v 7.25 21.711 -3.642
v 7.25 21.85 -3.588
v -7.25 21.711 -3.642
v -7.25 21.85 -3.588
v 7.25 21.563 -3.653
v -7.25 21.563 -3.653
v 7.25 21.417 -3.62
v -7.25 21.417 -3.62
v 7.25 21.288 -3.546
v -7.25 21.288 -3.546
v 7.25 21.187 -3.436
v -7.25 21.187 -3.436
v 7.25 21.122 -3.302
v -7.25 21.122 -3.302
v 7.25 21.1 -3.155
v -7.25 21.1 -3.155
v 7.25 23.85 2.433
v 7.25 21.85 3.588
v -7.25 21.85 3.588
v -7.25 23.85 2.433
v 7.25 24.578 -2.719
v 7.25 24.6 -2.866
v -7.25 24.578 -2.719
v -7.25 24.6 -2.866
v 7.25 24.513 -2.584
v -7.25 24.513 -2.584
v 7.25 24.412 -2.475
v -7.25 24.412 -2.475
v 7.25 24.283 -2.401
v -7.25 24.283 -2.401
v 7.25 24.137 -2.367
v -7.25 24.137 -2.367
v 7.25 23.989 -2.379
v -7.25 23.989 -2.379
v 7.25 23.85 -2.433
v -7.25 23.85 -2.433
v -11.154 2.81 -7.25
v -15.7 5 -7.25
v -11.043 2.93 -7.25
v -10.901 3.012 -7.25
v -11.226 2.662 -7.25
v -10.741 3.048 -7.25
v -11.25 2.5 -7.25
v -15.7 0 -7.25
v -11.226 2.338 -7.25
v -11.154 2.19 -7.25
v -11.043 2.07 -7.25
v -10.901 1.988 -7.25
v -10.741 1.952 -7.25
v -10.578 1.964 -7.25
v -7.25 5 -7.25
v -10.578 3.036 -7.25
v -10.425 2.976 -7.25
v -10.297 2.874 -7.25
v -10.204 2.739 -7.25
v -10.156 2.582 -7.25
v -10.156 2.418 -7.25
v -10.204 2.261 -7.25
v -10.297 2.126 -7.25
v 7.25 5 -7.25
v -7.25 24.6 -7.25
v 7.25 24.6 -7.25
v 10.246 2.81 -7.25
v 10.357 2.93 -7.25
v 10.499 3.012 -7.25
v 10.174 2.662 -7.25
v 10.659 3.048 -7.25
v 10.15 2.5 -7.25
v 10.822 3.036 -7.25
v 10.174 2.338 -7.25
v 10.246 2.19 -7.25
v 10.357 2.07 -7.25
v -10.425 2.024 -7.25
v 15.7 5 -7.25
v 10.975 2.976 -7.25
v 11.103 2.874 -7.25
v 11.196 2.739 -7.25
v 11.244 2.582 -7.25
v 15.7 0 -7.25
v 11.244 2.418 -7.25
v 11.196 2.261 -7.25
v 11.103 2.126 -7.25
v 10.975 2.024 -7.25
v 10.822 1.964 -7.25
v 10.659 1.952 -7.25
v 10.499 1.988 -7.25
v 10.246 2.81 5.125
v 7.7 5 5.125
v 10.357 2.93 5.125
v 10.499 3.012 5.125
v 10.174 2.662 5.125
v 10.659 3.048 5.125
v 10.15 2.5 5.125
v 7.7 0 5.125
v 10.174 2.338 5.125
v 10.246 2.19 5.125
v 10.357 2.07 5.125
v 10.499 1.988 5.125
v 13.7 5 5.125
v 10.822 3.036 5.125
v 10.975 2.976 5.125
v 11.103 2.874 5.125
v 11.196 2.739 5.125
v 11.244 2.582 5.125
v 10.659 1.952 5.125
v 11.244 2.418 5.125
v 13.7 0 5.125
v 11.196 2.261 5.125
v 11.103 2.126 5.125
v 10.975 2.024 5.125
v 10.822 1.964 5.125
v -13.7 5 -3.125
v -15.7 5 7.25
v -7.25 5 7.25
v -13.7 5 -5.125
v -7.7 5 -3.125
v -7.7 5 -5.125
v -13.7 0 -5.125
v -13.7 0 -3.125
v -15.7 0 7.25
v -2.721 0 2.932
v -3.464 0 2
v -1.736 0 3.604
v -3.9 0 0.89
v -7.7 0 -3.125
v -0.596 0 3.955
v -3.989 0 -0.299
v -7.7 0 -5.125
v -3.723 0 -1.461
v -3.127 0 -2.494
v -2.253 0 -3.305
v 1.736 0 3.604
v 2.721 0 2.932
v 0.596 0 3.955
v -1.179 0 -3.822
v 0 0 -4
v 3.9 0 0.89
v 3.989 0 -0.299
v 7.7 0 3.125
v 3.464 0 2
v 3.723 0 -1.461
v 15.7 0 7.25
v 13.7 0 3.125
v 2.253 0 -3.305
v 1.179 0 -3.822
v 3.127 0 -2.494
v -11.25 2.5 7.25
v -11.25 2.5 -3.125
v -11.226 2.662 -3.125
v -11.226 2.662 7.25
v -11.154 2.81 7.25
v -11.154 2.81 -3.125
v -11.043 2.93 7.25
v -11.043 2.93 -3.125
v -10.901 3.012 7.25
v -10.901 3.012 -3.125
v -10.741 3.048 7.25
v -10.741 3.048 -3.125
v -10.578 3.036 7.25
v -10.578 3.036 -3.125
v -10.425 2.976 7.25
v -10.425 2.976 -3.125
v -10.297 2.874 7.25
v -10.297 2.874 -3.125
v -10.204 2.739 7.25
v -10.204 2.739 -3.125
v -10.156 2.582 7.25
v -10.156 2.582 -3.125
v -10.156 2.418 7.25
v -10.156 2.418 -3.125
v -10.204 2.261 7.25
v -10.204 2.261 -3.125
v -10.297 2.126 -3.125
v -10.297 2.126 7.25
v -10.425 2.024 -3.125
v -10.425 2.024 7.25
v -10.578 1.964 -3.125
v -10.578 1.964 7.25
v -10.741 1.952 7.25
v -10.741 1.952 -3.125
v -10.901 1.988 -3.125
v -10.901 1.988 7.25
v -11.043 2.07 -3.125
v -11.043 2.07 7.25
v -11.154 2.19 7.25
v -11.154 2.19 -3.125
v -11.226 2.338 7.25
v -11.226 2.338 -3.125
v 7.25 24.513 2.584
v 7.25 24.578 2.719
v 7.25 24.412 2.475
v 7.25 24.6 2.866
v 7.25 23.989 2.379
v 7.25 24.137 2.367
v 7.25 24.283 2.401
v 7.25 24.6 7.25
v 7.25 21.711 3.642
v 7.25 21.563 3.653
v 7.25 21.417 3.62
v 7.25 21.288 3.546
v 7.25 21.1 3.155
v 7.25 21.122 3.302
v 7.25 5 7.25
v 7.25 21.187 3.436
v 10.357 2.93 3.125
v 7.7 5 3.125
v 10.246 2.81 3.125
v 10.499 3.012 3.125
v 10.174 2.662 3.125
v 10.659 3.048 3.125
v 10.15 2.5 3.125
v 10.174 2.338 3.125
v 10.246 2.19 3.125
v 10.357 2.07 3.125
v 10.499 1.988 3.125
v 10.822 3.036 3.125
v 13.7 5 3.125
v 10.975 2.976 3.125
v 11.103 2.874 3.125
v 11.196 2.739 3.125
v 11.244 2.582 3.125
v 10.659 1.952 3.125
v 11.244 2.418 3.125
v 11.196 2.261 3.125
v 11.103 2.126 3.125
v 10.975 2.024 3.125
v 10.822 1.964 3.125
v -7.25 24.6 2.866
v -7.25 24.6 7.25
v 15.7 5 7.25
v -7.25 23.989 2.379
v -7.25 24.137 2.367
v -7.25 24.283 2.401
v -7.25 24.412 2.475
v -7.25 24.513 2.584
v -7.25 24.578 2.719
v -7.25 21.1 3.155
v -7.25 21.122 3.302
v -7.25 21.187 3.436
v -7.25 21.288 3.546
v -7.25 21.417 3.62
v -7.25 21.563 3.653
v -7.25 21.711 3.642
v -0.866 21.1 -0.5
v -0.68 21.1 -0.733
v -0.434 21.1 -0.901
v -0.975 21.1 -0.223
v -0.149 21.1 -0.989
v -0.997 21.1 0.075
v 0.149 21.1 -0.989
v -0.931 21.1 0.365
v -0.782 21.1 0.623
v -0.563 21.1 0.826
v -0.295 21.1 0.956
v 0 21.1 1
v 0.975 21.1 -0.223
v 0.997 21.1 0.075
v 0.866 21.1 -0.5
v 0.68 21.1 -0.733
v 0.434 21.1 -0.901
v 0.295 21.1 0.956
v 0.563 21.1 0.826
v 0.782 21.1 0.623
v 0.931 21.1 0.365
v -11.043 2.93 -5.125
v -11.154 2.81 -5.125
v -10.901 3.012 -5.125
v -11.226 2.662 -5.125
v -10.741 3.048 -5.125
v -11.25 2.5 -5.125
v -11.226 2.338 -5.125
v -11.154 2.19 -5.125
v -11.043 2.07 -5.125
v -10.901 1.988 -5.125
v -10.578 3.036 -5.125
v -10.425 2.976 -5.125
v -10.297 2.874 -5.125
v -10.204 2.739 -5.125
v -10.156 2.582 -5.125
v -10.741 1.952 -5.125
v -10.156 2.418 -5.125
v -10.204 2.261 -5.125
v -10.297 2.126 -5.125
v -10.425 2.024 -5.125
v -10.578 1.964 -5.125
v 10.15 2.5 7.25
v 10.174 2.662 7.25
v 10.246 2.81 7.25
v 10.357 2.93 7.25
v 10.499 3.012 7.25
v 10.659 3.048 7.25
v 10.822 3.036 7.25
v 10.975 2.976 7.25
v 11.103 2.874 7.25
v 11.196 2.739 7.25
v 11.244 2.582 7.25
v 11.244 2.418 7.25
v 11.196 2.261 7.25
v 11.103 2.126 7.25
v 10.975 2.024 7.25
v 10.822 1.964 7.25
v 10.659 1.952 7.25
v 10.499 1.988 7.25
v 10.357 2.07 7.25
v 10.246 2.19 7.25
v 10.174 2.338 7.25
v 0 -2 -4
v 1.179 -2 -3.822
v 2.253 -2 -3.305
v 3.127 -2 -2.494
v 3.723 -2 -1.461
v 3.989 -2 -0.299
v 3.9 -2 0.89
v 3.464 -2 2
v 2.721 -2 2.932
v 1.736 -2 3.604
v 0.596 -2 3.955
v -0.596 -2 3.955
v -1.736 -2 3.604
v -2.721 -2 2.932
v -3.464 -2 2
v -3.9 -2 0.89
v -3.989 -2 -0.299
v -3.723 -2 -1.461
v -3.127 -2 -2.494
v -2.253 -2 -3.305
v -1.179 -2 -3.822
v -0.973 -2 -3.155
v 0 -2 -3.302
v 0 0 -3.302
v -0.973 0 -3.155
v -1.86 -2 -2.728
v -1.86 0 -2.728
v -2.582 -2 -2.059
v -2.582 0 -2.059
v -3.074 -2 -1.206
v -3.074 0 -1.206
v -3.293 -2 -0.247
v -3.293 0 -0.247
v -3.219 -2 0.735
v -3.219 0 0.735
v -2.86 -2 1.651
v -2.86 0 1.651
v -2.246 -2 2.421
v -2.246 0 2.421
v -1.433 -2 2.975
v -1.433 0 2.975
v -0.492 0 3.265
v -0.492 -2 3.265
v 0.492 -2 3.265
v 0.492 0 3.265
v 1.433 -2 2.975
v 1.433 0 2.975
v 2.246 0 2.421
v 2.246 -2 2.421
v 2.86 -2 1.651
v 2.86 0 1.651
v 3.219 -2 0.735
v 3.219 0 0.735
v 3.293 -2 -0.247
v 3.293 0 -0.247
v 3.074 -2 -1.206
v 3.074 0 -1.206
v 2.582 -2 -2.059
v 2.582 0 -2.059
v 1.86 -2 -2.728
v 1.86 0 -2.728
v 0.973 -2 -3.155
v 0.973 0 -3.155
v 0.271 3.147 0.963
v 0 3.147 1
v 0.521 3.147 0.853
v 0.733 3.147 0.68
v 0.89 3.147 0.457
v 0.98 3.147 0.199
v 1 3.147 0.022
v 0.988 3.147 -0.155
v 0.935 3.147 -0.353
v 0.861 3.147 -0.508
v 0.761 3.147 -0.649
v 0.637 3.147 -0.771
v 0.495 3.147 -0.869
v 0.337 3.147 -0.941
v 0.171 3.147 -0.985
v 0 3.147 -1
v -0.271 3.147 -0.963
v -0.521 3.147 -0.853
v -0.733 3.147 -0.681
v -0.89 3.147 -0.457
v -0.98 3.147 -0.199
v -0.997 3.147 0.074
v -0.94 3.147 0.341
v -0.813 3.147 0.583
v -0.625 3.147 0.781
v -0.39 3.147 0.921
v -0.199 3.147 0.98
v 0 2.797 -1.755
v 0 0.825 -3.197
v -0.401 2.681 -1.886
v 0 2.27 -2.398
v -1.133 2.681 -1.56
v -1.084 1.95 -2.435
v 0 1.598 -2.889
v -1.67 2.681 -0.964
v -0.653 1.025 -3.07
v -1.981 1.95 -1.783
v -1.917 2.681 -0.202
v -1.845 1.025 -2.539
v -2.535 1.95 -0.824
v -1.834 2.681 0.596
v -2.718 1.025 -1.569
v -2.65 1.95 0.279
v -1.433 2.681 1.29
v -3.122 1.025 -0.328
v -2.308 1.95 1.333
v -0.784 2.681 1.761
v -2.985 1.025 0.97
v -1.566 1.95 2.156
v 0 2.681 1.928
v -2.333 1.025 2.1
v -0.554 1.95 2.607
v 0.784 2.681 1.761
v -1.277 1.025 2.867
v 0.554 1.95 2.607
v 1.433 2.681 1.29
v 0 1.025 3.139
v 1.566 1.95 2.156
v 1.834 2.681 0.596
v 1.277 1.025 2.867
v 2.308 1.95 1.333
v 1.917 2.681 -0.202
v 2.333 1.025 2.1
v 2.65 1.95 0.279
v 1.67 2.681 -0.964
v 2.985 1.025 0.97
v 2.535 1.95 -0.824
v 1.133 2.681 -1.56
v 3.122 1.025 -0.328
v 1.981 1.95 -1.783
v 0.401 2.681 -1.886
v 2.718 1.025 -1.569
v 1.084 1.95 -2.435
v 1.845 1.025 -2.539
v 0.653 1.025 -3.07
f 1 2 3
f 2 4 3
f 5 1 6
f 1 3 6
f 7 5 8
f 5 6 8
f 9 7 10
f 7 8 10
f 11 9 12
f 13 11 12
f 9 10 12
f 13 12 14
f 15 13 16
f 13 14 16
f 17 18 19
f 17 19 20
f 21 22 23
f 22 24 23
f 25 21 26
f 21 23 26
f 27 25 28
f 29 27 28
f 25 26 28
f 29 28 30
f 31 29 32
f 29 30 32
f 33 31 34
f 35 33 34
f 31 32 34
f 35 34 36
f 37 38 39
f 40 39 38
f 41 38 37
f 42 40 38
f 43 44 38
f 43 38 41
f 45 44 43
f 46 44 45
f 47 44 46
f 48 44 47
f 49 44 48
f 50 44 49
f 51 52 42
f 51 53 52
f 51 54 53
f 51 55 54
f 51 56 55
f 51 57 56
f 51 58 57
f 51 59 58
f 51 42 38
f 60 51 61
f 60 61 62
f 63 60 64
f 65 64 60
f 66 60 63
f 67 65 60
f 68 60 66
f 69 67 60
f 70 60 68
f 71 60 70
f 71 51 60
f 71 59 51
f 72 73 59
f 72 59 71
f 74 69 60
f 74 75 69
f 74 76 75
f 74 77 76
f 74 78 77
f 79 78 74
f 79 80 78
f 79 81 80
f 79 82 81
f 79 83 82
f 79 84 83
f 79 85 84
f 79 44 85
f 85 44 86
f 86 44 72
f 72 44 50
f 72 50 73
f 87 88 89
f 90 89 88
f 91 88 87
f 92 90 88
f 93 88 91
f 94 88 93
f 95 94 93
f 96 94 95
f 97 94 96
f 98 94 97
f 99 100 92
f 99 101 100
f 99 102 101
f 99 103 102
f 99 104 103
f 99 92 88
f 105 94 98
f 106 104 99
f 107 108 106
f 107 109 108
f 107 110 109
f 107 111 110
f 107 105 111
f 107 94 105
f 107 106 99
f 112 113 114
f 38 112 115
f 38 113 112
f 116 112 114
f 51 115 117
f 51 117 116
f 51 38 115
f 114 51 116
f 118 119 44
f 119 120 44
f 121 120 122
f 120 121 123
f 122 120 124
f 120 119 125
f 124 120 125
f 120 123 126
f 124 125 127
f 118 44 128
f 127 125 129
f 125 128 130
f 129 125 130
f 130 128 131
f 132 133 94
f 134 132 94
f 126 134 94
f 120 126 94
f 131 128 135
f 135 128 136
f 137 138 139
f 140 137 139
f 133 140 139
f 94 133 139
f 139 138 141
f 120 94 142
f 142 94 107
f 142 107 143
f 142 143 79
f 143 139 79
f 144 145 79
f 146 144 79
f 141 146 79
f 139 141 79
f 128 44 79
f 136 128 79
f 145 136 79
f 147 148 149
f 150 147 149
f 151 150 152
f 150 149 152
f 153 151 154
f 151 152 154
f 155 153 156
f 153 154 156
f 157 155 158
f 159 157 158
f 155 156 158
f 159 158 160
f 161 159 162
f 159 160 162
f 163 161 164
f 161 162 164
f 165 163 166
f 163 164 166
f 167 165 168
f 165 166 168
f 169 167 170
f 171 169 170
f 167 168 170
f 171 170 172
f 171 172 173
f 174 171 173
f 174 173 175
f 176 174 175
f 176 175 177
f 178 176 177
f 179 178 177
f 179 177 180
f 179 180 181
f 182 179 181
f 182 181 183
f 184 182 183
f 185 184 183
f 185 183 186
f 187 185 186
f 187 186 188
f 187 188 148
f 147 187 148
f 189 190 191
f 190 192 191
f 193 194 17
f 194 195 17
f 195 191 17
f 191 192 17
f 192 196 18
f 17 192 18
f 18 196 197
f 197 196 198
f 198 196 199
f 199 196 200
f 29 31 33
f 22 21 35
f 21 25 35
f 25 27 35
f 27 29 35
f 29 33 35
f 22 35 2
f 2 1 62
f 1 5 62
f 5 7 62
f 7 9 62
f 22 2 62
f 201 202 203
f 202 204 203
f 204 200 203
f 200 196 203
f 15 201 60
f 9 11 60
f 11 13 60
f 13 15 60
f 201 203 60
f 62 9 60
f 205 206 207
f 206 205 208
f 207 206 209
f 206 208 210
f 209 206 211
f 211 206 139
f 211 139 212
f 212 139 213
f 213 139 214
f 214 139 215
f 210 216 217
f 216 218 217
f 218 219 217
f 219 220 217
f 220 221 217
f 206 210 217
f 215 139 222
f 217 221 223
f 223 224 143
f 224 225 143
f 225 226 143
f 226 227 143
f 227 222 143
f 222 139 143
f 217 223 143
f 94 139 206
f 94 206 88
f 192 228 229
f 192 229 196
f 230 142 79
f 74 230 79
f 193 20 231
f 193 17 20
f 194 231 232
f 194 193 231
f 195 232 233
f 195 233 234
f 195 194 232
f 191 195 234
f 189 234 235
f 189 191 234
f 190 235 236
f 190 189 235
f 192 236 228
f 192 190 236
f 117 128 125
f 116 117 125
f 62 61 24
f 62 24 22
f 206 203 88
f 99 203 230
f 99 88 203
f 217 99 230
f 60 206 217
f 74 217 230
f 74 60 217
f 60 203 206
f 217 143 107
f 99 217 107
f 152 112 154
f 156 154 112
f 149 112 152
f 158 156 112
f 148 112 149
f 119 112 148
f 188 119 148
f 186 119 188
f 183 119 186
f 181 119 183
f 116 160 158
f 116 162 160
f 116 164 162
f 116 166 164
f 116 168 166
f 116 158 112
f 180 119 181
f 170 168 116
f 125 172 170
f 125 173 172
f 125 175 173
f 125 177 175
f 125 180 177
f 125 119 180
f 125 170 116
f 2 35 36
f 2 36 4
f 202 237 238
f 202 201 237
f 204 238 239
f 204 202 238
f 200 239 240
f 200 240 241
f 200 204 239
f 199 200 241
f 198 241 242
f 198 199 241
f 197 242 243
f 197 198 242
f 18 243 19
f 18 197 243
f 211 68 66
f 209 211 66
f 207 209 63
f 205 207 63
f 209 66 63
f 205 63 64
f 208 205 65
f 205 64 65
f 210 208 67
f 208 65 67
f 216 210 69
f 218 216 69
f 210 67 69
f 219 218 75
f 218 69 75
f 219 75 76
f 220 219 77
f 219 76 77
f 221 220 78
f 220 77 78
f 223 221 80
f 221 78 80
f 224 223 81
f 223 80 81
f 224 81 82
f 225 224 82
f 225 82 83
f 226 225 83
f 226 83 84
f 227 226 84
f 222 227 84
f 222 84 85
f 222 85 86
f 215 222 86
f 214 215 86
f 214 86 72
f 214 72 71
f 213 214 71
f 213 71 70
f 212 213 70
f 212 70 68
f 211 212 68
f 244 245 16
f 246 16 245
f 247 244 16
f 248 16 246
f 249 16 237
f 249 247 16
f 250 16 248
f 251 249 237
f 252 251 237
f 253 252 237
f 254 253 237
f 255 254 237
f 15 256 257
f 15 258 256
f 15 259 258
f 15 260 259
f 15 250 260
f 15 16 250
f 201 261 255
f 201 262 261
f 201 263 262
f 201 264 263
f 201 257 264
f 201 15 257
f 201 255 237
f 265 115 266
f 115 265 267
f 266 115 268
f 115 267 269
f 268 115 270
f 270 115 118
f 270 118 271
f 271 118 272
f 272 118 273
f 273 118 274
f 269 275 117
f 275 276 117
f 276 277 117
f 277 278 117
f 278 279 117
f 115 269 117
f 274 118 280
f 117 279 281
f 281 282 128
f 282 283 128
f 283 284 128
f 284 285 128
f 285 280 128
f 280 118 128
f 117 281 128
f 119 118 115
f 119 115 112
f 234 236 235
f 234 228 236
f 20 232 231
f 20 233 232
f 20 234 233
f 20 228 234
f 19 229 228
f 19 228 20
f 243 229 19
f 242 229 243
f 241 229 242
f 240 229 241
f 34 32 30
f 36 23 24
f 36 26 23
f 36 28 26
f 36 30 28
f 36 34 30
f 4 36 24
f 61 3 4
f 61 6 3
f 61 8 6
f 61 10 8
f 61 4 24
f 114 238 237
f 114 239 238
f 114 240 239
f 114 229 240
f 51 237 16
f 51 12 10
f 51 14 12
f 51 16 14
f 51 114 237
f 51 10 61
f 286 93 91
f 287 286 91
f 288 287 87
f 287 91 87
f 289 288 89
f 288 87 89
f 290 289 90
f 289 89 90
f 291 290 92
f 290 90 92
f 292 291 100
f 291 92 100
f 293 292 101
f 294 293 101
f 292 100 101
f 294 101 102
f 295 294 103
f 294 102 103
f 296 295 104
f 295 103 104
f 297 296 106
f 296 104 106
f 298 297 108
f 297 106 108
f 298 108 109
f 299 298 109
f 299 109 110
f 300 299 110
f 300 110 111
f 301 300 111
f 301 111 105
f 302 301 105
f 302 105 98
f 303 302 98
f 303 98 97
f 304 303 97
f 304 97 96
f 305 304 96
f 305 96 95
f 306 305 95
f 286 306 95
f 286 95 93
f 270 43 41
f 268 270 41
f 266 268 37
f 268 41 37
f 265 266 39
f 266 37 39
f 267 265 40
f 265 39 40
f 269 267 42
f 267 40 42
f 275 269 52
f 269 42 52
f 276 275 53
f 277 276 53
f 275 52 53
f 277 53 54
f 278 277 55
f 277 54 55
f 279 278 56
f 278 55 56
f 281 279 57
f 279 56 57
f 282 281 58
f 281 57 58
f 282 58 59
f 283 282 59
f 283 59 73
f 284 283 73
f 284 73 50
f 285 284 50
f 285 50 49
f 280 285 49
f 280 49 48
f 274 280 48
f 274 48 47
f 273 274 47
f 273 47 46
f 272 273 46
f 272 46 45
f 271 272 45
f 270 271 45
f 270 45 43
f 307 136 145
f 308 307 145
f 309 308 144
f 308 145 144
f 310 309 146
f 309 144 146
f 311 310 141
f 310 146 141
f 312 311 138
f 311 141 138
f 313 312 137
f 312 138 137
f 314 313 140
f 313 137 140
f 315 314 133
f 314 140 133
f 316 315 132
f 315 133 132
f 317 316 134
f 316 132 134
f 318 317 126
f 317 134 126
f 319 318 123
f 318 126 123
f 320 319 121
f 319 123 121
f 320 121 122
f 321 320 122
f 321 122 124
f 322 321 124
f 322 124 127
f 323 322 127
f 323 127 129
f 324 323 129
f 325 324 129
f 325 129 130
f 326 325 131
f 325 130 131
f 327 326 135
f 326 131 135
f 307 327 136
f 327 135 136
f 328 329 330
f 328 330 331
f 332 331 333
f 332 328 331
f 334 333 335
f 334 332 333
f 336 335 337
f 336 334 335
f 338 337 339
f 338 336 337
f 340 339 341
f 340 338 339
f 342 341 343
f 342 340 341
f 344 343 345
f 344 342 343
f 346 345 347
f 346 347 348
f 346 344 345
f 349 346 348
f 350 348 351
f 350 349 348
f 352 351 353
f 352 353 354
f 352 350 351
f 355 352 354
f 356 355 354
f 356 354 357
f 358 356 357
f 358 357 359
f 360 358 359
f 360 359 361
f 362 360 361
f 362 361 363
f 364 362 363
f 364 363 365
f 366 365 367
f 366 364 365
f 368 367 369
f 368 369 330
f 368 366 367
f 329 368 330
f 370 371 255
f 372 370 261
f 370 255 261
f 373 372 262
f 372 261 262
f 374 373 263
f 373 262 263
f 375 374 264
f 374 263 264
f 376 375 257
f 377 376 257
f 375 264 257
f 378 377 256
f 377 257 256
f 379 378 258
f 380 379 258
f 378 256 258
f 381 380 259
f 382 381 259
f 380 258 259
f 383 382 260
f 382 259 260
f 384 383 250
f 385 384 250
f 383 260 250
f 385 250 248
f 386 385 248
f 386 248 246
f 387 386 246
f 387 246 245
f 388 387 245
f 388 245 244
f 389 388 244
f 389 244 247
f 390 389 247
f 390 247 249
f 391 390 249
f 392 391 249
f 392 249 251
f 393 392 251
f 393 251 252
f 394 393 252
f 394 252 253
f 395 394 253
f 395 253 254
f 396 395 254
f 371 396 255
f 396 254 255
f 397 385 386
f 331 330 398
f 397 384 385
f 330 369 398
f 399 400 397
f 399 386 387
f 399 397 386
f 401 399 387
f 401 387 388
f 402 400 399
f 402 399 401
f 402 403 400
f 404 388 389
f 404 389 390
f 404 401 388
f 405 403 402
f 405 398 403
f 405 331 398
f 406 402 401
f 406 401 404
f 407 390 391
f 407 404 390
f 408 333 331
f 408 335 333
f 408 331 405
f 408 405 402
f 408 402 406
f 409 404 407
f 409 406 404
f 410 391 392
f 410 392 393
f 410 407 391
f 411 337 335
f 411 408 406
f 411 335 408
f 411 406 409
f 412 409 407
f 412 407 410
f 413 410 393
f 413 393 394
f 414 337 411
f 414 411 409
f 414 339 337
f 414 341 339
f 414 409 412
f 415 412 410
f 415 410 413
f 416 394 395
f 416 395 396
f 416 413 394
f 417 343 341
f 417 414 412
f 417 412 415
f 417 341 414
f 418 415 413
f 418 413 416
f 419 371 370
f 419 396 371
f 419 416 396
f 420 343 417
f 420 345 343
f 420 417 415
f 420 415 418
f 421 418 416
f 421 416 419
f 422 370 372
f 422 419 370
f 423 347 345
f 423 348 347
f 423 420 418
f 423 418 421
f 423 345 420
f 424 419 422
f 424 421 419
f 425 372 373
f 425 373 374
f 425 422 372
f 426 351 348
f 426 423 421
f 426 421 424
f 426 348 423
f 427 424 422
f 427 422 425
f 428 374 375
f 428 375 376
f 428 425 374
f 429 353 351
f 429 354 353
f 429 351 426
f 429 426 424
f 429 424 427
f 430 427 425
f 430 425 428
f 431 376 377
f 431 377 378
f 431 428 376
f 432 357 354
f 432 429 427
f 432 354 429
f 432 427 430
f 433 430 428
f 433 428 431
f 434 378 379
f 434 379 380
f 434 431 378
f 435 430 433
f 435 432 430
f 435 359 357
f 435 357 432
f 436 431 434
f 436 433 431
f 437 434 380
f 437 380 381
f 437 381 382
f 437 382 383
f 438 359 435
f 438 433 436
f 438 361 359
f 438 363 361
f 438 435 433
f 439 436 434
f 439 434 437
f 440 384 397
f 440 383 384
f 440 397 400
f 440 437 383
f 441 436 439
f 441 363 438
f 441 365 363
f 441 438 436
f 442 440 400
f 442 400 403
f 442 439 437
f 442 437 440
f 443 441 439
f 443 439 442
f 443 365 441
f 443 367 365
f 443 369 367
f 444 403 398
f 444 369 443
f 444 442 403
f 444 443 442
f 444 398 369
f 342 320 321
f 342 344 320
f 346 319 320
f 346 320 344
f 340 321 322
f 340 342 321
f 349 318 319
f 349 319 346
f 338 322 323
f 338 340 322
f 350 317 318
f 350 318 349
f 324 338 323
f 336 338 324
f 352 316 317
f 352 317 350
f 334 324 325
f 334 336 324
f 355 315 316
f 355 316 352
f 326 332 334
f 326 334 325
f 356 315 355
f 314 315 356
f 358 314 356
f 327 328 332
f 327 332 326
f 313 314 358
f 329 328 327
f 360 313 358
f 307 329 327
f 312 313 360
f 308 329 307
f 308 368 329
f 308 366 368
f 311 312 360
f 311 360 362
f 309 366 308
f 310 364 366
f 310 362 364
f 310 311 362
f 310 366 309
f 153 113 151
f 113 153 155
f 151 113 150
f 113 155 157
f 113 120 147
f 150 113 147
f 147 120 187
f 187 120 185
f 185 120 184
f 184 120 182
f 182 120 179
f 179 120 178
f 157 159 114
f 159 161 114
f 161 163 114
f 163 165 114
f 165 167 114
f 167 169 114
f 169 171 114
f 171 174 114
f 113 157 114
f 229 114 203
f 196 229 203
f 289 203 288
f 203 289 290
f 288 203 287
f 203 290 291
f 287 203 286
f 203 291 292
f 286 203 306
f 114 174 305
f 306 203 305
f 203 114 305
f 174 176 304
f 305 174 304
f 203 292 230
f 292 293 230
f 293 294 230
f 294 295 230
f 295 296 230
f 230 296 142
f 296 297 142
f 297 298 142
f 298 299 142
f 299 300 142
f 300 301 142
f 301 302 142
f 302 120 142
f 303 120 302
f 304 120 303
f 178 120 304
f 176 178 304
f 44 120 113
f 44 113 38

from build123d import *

# Parameters (mm, degrees)
SKETCH1_W           = 14.5
SKETCH1_H           = 14.5
BOSS_EXTRUDE1_DEPTH = 24.6
CUT_EXTRUDE1_DEPTH  = 10
SKETCH4_R           = 4
BOSS_EXTRUDE2_DEPTH = 2
FILLET1_R           = 0.5
SKETCH6_W           = 8.45
SKETCH6_H           = 14.5
BOSS_EXTRUDE3_DEPTH = 5
SKETCH7_W           = 6
SKETCH7_H           = 2
CUT_EXTRUDE2_DEPTH  = 5
SKETCH8_R           = 0.55
CUT_EXTRUDE3_DEPTH  = 33.586807146
SKETCH9_R           = 1
CUT_EXTRUDE4_DEPTH  = 29.855891946


with BuildPart() as part:
    # Sketch1 → Boss-Extrude1 (new body)
    with BuildSketch(Plane(origin=(0, 0, 0), x_dir=(1, 0, 0), z_dir=(0, 1, 0))):
        Rectangle(SKETCH1_W, SKETCH1_H)
    extrude(amount=BOSS_EXTRUDE1_DEPTH)

    # Sketch2 → Cut-Extrude1 (cut, symmetric)
    with BuildSketch(Plane(origin=(0, 0, 0), x_dir=(0, 0, -1), z_dir=(1, 0, 0))):
        Polygon((-2, 24.6), (2, 24.6), (4.020725942, 21.1), (-4.020725942, 21.1), align=None)
    extrude(amount=CUT_EXTRUDE1_DEPTH, both=True, mode=Mode.SUBTRACT)

    # Sketch4 → Boss-Extrude2 (add)
    with BuildSketch(Plane.XZ):
        with Locations(Location((0, 0, 0), (0, 0, 270))):
            Circle(SKETCH4_R)
    extrude(amount=BOSS_EXTRUDE2_DEPTH)

    # Sketch3 → Cut-Revolve1 (revolve, cut)
    with BuildSketch(Plane(origin=(0, 0, 0), x_dir=(0, 0, -1), z_dir=(1, 0, 0))):
        with BuildLine():
            Line((3.302, 0), (3.302, -3.302))
            Line((3.302, -3.302), (0, -3.302))
            Line((0, -3.302), (0, 0))
            Line((0, 0), (0, 3.302))
            ThreePointArc((0, 3.302), (2.334866591, 2.334866591), (3.302, 0))
        make_face()
    revolve(axis=Axis((0, 0, 0), (0, 1, 0)), mode=Mode.SUBTRACT)

    # Fillet1
    fillet1_edges = [part.edges().sort_by_distance(p)[0] for p in [
        (0, 24.6, 2),
        (0, 24.6, -2),
        (0, 21.1, -4.020725942),
        (0, 21.1, 4.020725942),
    ]]
    fillet(fillet1_edges, radius=FILLET1_R)

    # Sketch6 → Boss-Extrude3 (add)
    with BuildSketch(Plane(origin=(0, 0, 0), x_dir=(1, 0, 0), z_dir=(0, 1, 0))):
        with Locations((11.475, 0)):
            Rectangle(SKETCH6_W, SKETCH6_H)
        with Locations((-11.475, 0)):
            Rectangle(SKETCH6_W, SKETCH6_H)
    extrude(amount=BOSS_EXTRUDE3_DEPTH)

    # Sketch7 → Cut-Extrude2 (cut)
    with BuildSketch(Plane.XZ):
        with Locations((10.7, 4.125)):
            Rectangle(SKETCH7_W, SKETCH7_H)
        with Locations((-10.7, -4.125)):
            Rectangle(SKETCH7_W, SKETCH7_H)
    extrude(amount=-CUT_EXTRUDE2_DEPTH, mode=Mode.SUBTRACT)

    # Sketch8 → Cut-Extrude3 (cut, through all)
    with BuildSketch(Plane(origin=(0, 0, -7.25), x_dir=(-1, 0, 0), z_dir=(0, 0, -1))):
        with Locations((-10.7, 2.5)):
            Circle(SKETCH8_R)
        with Locations((10.7, 2.5)):
            Circle(SKETCH8_R)
    extrude(amount=-CUT_EXTRUDE3_DEPTH, mode=Mode.SUBTRACT)

    # Sketch9 → Cut-Extrude4 (cut, through all)
    with BuildSketch(Plane(origin=(0, 21.1, 0), x_dir=(1, 0, 0), z_dir=(0, 1, 0))):
        with Locations(Location((0, 0, 0), (0, 0, 270))):
            Circle(SKETCH9_R)
    extrude(amount=-CUT_EXTRUDE4_DEPTH, mode=Mode.SUBTRACT)


solid = part.part
